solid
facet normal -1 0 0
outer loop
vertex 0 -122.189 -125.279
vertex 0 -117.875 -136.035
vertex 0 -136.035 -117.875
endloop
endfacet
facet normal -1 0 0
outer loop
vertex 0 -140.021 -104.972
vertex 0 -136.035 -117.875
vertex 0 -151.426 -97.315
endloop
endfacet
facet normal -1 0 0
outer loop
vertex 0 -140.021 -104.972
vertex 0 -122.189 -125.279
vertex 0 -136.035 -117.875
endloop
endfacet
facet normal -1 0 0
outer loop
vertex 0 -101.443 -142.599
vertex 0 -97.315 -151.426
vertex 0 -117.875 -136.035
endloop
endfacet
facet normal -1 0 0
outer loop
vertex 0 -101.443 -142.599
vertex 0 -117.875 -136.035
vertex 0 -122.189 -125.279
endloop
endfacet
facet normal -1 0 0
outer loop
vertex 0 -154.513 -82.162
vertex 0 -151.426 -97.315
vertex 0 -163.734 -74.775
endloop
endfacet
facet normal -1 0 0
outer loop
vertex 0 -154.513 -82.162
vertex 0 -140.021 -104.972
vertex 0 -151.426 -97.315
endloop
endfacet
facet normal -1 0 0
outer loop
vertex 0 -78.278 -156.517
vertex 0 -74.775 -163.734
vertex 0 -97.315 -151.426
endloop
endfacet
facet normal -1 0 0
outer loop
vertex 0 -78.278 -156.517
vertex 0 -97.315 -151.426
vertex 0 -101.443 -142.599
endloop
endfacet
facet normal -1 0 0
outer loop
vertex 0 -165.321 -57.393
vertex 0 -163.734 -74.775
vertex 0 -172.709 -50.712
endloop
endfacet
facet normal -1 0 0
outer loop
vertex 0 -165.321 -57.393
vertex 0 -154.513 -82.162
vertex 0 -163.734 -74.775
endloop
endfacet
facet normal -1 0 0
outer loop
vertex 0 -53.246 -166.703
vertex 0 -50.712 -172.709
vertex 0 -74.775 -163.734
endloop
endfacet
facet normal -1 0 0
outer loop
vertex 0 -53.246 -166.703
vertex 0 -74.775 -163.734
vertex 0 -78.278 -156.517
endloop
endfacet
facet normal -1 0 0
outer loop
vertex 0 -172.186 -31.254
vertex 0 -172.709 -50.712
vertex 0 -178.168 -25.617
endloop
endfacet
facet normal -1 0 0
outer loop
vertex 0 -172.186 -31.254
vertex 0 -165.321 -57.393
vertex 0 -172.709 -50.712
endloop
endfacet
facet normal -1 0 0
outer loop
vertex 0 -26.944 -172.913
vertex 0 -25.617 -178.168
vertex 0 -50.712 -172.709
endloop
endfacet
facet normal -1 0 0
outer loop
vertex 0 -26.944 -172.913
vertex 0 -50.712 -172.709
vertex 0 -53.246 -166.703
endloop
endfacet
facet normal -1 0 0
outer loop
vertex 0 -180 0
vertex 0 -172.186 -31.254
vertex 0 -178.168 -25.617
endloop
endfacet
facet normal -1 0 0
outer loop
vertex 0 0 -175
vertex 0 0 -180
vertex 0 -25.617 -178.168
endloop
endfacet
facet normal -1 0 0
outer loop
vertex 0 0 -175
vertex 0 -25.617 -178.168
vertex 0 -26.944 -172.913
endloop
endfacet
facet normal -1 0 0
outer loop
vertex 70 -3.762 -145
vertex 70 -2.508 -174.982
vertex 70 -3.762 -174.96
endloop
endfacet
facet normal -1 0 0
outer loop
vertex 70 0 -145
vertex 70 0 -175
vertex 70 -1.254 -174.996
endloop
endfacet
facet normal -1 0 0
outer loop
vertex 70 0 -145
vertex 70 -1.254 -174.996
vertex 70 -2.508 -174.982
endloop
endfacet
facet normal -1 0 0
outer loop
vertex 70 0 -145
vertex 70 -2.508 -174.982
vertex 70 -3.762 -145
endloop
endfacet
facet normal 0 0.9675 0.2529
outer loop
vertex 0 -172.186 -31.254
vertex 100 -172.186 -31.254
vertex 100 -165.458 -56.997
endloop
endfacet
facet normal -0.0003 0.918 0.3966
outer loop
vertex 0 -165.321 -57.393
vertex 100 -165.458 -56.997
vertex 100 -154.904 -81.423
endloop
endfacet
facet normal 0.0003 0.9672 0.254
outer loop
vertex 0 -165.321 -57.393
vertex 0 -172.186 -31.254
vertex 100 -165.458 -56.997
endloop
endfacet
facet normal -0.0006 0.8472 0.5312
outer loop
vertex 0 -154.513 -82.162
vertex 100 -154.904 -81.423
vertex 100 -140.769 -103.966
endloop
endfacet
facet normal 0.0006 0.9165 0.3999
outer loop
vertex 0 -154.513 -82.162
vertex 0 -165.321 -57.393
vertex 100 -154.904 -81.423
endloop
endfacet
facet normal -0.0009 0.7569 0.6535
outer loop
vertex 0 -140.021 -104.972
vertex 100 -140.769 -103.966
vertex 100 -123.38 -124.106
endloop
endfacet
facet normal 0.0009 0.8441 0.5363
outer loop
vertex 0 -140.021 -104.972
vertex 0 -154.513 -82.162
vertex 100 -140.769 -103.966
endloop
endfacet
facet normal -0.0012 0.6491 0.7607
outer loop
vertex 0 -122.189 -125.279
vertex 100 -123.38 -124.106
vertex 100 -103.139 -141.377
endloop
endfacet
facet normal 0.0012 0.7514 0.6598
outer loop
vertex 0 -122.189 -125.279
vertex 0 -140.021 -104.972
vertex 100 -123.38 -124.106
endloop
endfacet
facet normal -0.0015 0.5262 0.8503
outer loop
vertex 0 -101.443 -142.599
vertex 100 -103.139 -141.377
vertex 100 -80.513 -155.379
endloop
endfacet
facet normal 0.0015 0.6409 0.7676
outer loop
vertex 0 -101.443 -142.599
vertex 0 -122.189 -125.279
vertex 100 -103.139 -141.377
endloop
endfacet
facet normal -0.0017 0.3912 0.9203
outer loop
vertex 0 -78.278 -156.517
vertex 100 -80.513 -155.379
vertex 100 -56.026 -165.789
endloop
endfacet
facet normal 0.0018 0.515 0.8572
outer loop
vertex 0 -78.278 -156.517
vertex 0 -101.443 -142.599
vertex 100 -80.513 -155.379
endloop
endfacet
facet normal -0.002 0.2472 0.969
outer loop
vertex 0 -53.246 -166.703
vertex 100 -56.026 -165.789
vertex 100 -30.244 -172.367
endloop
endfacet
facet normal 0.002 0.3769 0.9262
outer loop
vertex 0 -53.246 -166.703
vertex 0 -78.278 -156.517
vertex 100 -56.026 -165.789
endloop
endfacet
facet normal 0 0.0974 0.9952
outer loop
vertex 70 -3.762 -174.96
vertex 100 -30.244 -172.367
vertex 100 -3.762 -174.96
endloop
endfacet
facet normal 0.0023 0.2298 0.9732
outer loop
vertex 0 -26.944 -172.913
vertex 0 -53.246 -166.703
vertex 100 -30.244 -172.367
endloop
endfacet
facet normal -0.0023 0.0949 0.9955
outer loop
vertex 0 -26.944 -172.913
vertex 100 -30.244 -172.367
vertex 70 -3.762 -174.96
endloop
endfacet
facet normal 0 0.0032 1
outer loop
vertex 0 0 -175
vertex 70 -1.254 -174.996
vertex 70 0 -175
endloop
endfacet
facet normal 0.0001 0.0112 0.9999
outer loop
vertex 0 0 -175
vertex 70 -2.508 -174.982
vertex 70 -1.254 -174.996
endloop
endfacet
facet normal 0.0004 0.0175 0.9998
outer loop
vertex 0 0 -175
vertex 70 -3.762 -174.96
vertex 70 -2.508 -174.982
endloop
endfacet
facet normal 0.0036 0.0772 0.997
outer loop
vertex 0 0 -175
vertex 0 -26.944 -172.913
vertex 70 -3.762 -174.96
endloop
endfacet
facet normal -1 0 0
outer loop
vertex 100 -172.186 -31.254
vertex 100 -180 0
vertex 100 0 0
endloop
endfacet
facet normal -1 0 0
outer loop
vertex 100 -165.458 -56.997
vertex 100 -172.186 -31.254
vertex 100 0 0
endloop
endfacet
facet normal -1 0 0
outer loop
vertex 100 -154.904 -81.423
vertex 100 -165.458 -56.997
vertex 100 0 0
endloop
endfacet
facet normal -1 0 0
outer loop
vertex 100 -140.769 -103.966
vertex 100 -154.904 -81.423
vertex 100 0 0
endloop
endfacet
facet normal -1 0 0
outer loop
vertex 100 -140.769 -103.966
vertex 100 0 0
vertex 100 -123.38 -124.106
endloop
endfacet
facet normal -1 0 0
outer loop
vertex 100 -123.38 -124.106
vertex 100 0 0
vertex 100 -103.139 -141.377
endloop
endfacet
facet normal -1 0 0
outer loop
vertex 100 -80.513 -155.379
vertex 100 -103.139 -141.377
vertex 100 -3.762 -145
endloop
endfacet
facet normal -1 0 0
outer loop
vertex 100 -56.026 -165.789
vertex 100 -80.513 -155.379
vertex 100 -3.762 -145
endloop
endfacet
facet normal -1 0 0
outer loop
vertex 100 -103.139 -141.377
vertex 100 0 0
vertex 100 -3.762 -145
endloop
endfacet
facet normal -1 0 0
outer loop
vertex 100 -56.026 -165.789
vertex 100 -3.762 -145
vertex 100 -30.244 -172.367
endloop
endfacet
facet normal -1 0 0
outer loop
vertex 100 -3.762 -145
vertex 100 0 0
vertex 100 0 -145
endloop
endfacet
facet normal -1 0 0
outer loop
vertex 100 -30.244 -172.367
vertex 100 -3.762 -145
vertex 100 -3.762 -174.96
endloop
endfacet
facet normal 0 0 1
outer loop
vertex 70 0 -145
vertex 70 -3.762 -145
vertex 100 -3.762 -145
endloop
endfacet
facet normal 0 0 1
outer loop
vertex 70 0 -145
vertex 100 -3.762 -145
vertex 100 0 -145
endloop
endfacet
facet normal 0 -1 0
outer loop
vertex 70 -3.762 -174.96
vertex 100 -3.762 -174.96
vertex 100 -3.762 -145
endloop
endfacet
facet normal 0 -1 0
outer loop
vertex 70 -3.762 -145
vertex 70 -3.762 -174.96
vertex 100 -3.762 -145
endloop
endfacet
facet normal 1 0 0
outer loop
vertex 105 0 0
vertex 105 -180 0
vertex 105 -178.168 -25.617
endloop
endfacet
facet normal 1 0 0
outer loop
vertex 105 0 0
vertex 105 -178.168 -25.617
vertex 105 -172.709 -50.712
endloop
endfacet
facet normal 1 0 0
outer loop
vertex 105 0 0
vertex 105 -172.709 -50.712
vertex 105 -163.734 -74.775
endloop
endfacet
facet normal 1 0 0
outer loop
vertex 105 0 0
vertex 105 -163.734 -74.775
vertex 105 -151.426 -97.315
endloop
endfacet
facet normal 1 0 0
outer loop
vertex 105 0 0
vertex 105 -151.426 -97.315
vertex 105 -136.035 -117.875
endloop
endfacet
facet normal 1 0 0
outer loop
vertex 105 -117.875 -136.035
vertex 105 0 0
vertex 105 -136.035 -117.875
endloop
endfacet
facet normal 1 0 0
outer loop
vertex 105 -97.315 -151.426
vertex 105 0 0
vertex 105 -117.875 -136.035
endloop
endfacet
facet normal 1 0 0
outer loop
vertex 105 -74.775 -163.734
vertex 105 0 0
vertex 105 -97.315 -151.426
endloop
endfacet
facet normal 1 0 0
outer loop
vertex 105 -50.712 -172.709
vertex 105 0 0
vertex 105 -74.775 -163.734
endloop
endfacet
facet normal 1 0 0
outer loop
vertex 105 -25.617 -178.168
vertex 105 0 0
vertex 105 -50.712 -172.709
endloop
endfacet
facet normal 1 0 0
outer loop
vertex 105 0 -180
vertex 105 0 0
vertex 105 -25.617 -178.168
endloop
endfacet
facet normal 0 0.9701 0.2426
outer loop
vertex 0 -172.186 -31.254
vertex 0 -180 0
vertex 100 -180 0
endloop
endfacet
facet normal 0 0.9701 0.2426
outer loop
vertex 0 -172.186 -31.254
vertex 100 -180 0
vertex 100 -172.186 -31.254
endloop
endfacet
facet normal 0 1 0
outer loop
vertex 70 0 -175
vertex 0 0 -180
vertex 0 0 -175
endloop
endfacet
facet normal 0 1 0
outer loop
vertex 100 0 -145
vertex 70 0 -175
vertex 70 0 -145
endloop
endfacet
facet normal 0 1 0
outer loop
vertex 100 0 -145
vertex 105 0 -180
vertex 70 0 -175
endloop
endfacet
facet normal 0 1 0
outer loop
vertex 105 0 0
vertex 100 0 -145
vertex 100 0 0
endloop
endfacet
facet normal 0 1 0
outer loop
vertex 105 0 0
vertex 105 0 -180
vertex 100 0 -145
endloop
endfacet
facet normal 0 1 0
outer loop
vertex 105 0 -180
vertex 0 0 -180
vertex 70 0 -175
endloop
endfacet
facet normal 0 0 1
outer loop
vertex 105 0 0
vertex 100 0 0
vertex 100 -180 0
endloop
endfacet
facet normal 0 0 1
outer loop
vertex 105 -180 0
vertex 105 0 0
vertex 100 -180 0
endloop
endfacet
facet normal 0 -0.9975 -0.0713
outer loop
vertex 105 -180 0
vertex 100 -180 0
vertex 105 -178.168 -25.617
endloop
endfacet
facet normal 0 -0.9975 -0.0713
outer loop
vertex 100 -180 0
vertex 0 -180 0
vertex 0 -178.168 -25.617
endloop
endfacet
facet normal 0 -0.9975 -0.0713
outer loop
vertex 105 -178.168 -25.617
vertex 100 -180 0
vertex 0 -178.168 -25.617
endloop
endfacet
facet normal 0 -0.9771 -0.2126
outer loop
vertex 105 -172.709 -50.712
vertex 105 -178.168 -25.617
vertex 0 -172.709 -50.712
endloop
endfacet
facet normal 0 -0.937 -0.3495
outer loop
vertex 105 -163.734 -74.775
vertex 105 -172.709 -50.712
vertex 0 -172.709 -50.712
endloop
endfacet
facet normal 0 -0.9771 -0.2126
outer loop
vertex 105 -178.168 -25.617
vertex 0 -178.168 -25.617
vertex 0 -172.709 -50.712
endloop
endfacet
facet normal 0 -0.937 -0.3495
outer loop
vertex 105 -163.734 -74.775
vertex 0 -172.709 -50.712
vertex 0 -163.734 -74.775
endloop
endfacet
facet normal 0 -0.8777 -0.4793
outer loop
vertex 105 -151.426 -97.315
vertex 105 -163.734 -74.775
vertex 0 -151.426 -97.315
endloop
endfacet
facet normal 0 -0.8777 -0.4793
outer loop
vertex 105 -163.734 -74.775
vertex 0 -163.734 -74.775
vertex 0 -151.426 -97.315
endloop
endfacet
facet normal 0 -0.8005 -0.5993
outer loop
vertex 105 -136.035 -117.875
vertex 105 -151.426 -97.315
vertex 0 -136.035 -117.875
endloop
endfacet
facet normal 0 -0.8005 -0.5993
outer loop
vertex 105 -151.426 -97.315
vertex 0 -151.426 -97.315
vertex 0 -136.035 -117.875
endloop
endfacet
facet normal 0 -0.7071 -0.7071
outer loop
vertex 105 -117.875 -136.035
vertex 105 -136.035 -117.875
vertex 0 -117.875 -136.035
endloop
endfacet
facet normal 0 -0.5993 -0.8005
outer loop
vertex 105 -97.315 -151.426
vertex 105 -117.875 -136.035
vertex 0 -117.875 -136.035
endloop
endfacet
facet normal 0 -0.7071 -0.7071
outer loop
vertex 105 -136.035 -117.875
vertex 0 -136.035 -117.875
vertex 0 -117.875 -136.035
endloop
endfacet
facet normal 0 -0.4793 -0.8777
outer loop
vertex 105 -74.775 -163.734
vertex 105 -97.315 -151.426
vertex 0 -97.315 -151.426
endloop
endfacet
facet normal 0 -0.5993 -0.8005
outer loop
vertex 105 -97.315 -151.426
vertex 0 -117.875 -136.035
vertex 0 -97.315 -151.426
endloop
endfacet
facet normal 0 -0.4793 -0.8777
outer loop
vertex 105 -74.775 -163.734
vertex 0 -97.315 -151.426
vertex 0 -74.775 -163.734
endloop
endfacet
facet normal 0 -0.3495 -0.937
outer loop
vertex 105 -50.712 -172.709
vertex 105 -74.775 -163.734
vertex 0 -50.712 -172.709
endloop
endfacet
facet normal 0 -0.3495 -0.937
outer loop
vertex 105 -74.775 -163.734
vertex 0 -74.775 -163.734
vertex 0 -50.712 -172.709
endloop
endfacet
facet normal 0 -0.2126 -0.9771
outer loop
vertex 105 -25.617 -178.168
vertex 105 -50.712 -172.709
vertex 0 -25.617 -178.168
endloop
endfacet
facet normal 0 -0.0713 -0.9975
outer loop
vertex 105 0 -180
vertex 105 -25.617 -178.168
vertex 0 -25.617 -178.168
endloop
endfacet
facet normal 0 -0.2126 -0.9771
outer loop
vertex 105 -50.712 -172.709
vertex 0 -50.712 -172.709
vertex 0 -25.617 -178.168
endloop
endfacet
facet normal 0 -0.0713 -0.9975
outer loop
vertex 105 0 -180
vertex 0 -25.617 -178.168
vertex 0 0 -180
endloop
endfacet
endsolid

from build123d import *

# Parameters (mm, degrees)
BOSS_EXTRUDE1_DEPTH = 100
BOSS_EXTRUDE2_DEPTH = 5
CHAMFER1_SIZE       = 5
SKETCH4_W           = 30
SKETCH4_H           = 3.762328583
BOSS_EXTRUDE3_DEPTH = 30


with BuildPart() as part:
    # Sketch2 → Boss-Extrude1 (new body)
    with BuildSketch(Plane(origin=(0, 0, 0), x_dir=(0, 0, -1), z_dir=(1, 0, 0))):
        with BuildLine():
            Line((175, 0), (180, 0))
            ThreePointArc((180, 0), (127.279220614, -127.279220614), (0, -180))
            Line((0, -180), (0, -175))
            ThreePointArc((0, -175), (123.743686708, -123.743686708), (175, 0))
        make_face()
    extrude(amount=BOSS_EXTRUDE1_DEPTH)

    # Sketch3 → Boss-Extrude2 (add)
    with BuildSketch(Plane(origin=(100, 0, 0), x_dir=(0, 0, -1), z_dir=(1, 0, 0))):
        with BuildLine():
            Line((0, 0), (0, -180))
            ThreePointArc((0, -180), (127.279220614, -127.279220614), (180, 0))
            Line((180, 0), (0, 0))
        make_face()
    extrude(amount=BOSS_EXTRUDE2_DEPTH)

    # Chamfer1
    # the kernel refuses this chamfer: 20, 5 mm, written as the material it takes off along each edge
    with BuildSketch(Plane(origin=(-80.427863616, -175, 0), x_dir=(0, -1, 0), z_dir=(1, 0, 0))) as chamfer1_piece_1:
        with BuildLine():
            Line((CHAMFER1_SIZE, 0), (-2.813534961, 31.254139845))
            ThreePointArc((-2.813534961, 31.254139845), (-0.740839573, 16.085552754), (0, 0))
            Line((0, 0), (CHAMFER1_SIZE, 0))
        make_face()
    extrude(amount=180.427863616, mode=Mode.SUBTRACT)

    # Sketch4 → Boss-Extrude3 (add)
    with BuildSketch(Plane.ZY.offset(-100)):
        with Locations((-160, -1.881164292)):
            Rectangle(SKETCH4_W, SKETCH4_H)
    extrude(amount=BOSS_EXTRUDE3_DEPTH)


solid = part.part
